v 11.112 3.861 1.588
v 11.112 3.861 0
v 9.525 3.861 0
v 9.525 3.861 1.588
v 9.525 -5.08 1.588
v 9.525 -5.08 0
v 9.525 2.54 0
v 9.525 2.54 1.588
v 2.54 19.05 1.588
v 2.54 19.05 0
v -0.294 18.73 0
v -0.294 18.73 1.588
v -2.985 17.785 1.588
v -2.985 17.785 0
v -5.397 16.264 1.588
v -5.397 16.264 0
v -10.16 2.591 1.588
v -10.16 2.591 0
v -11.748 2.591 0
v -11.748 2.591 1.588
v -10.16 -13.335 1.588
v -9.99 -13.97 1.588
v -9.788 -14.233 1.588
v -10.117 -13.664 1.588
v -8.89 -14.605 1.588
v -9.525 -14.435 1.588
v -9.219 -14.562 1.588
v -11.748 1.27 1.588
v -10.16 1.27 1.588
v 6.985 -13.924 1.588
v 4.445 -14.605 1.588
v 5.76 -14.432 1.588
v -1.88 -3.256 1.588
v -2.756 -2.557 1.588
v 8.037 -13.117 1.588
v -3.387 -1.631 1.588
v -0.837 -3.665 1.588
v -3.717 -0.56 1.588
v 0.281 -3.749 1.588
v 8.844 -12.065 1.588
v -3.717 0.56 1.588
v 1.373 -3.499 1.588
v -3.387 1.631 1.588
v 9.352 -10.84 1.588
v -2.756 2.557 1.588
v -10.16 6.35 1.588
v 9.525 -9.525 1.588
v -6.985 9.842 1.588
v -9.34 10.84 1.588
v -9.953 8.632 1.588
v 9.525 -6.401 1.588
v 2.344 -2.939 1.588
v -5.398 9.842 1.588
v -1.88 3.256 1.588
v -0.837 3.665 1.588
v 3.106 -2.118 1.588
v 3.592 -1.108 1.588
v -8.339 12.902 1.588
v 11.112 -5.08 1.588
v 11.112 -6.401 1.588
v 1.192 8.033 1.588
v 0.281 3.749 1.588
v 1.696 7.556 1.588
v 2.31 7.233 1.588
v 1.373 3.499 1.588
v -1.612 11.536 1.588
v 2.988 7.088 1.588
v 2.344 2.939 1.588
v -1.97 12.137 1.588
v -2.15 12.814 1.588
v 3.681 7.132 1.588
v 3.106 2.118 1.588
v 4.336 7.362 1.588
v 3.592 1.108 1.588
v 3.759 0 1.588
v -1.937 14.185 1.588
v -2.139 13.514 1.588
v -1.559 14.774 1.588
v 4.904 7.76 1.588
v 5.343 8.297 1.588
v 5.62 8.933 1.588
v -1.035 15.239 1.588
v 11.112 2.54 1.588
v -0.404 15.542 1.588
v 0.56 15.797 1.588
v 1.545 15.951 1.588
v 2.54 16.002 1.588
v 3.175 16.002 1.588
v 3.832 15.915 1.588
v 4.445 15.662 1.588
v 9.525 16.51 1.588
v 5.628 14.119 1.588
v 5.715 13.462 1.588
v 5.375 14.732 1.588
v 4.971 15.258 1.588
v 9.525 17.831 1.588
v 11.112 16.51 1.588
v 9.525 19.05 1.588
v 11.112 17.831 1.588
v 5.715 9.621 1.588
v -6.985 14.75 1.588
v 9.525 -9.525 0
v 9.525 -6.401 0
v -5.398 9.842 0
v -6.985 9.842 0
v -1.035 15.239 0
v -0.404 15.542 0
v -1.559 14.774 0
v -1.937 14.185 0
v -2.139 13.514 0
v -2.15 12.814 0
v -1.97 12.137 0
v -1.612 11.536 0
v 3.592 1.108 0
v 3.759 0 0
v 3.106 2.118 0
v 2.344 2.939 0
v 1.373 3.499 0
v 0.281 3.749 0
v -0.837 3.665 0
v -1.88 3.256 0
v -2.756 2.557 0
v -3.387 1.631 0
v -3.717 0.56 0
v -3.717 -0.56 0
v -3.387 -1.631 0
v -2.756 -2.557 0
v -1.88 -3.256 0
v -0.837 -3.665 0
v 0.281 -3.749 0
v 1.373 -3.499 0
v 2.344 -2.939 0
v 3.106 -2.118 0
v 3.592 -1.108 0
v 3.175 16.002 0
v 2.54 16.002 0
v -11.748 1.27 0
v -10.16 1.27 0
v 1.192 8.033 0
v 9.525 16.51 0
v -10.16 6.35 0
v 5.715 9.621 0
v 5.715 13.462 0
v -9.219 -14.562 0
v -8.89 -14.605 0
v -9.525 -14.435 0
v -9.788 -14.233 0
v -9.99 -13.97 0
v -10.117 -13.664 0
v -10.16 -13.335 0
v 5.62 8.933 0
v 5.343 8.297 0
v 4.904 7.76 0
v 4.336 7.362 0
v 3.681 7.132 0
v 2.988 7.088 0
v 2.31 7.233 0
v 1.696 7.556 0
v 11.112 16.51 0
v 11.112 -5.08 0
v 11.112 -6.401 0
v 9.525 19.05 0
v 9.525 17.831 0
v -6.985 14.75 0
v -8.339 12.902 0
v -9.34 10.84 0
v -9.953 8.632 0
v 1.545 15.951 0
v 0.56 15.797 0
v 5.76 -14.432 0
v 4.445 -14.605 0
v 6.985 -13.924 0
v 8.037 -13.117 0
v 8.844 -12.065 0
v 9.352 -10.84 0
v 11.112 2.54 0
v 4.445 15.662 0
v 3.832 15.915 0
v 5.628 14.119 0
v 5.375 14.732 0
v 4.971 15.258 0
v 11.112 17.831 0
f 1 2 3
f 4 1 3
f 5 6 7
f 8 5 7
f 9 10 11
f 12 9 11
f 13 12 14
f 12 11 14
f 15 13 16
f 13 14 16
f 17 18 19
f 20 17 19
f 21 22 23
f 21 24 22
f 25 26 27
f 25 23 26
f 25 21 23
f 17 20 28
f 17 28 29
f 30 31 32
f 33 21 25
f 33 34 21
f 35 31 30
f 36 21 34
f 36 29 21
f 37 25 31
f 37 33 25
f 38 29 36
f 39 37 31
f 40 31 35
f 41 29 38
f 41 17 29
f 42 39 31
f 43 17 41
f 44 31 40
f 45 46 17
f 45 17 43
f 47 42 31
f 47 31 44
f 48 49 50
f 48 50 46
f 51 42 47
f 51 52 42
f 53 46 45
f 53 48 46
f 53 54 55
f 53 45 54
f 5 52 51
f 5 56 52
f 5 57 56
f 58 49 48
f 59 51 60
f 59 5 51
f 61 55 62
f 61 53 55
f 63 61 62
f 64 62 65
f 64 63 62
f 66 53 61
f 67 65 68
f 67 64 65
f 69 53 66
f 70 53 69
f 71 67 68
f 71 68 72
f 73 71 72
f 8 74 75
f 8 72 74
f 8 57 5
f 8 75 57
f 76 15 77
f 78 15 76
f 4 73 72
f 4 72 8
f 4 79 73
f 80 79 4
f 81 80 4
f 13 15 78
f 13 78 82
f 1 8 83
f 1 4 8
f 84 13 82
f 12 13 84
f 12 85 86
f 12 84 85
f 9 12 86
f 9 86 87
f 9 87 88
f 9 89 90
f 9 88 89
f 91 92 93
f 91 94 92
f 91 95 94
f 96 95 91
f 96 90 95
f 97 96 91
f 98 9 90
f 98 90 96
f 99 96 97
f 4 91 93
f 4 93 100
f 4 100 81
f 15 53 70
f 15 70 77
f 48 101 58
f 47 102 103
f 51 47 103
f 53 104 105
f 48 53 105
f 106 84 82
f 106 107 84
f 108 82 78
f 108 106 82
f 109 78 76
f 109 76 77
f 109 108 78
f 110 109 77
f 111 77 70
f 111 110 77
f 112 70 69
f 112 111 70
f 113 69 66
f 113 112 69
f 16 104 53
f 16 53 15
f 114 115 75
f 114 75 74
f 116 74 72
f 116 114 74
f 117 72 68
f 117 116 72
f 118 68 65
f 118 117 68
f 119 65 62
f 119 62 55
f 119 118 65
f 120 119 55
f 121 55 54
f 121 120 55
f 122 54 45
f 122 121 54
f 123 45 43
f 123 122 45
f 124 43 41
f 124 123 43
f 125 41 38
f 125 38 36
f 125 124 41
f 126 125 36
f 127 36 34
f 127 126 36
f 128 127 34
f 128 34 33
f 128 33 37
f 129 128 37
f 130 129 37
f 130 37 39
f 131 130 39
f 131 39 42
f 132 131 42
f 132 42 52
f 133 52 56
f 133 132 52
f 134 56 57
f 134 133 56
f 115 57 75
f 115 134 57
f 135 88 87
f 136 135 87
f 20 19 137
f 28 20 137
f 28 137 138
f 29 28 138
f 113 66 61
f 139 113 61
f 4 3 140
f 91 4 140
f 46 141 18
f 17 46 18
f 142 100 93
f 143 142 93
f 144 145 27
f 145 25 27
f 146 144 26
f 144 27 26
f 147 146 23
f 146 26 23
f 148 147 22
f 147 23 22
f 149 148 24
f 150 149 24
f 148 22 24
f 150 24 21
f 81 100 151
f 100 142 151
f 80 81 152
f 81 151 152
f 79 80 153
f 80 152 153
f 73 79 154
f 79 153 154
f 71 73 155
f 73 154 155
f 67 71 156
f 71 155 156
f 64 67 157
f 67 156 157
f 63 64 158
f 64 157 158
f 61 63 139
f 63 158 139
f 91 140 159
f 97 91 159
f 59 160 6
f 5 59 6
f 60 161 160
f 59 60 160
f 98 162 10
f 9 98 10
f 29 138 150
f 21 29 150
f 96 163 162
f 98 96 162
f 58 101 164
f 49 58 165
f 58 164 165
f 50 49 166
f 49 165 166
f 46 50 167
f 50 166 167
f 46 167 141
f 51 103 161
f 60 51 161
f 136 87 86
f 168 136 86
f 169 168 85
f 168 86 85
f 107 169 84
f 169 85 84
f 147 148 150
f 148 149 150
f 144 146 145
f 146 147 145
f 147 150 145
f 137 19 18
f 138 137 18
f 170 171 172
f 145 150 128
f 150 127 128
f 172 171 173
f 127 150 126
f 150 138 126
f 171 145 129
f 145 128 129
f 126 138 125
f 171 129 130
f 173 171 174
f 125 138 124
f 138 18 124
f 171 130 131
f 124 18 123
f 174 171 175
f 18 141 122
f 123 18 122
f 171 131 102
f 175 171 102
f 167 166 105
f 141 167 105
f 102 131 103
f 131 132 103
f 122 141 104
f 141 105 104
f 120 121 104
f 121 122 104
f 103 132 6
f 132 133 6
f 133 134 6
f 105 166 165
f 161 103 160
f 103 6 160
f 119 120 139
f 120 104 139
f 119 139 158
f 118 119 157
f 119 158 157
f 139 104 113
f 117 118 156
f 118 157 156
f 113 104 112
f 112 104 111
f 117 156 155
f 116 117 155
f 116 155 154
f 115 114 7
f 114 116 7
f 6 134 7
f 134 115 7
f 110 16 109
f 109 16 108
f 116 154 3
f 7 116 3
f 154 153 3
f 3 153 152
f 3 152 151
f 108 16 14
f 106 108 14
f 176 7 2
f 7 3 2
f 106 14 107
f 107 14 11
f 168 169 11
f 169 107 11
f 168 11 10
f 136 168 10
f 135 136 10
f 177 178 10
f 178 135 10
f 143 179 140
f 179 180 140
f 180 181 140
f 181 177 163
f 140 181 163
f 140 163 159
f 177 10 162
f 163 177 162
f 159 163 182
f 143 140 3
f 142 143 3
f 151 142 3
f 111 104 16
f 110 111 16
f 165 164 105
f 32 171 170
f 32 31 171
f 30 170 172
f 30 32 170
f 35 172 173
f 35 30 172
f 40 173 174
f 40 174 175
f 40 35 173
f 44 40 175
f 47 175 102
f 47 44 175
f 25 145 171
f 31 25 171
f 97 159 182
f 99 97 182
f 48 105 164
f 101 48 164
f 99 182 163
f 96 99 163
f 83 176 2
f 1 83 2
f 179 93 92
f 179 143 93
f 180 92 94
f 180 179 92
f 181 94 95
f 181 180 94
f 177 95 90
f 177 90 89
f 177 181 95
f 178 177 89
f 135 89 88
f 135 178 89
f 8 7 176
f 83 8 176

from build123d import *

# Parameters (mm, degrees)
SKETCH1_R              = 3.7592
BOSS_EXTRUDE1_DEPTH    = 1.5875
FILLET1_R              = 5.08
FILLET2_R              = 1.27
SKETCH3_W              = 1.5875
SKETCH3_H              = 9.2075
CUT_EXTRUDE1_DEPTH     = 23.437165875
WEIGHT_REDUCTION_REACH = 24.437
FILLET3_R              = 2.54


with BuildPart() as part:
    # Sketch1 → Boss-Extrude1 (new body)
    with BuildSketch(Plane.XY):
        with BuildLine():
            Line((11.1125, 17.8308), (9.525, 17.8308))
            Line((9.525, 17.8308), (9.525, 19.05))
            Line((9.525, 19.05), (2.54, 19.05))
            ThreePointArc((2.54, 19.05), (-6.440256121, 15.330256121), (-10.16, 6.35))
            Line((-10.16, 6.35), (-10.16, 2.5908))
            Line((-10.16, 2.5908), (-11.7475, 2.5908))
            Line((-11.7475, 2.5908), (-11.7475, 1.27))
            Line((-11.7475, 1.27), (-10.16, 1.27))
            Line((-10.16, 1.27), (-10.16, -14.605))
            Line((-10.16, -14.605), (9.525, -14.605))
            Line((9.525, -14.605), (9.525, -6.4008))
            Line((9.525, -6.4008), (11.1125, -6.4008))
            Line((11.1125, -6.4008), (11.1125, -5.08))
            Line((11.1125, -5.08), (9.525, -5.08))
            Line((9.525, -5.08), (9.525, 2.54))
            Line((9.525, 2.54), (11.1125, 2.54))
            Line((11.1125, 2.54), (11.1125, 3.8608))
            Line((11.1125, 3.8608), (9.525, 3.8608))
            Line((9.525, 3.8608), (9.525, 16.51))
            Line((9.525, 16.51), (11.1125, 16.51))
            Line((11.1125, 16.51), (11.1125, 17.8308))
        make_face()
        Circle(SKETCH1_R, mode=Mode.SUBTRACT)
    extrude(amount=BOSS_EXTRUDE1_DEPTH)

    # Fillet1
    fillet1_edges = [part.edges().sort_by_distance(p)[0] for p in [
        (9.525, -14.605, 0.79375),
    ]]
    fillet(fillet1_edges, radius=FILLET1_R)

    # Fillet2
    fillet2_edges = [part.edges().sort_by_distance(p)[0] for p in [
        (-10.16, -14.605, 0.79375),
    ]]
    fillet(fillet2_edges, radius=FILLET2_R)

    # Sketch3 → Cut-Extrude1 (cut, through all)
    with BuildSketch(Plane(origin=(0, 0, 0), x_dir=(-1, 0, 0), z_dir=(0, 0, -1))):
        with Locations((6.19125, 14.44625)):
            Rectangle(SKETCH3_W, SKETCH3_H)
    extrude(amount=-CUT_EXTRUDE1_DEPTH, mode=Mode.SUBTRACT)

    # Sketch2 → Weight Reduction (cut, up to next)
    with BuildSketch(Plane.XY.offset(1.5875), mode=Mode.PRIVATE) as weight_reduction_sk1:
        with BuildLine():
            Line((-3.4925, 13.884590085), (5.715, 2.384426271))
            Line((5.715, 2.384426271), (5.715, 16.002))
            Line((5.715, 16.002), (2.54, 16.002))
            ThreePointArc((2.54, 16.002), (-0.656657668, 15.457276418), (-3.4925, 13.884590085))
        make_face()
    weight_reduction_tool1 = extrude(weight_reduction_sk1.sketch, amount=-WEIGHT_REDUCTION_REACH, mode=Mode.PRIVATE) & part.part
    add(weight_reduction_tool1.solids().sort_by_distance((2.48474, 11.130093, 1.5875))[0], mode=Mode.SUBTRACT)

    # Fillet3
    fillet3_edges = [part.edges().sort_by_distance(p)[0] for p in [
        (5.715, 16.002, 0.79375),
        (5.715, 2.384426271, 0.79375),
        (-3.4925, 13.884590085, 0.79375),
    ]]
    fillet(fillet3_edges, radius=FILLET3_R)


solid = part.part
